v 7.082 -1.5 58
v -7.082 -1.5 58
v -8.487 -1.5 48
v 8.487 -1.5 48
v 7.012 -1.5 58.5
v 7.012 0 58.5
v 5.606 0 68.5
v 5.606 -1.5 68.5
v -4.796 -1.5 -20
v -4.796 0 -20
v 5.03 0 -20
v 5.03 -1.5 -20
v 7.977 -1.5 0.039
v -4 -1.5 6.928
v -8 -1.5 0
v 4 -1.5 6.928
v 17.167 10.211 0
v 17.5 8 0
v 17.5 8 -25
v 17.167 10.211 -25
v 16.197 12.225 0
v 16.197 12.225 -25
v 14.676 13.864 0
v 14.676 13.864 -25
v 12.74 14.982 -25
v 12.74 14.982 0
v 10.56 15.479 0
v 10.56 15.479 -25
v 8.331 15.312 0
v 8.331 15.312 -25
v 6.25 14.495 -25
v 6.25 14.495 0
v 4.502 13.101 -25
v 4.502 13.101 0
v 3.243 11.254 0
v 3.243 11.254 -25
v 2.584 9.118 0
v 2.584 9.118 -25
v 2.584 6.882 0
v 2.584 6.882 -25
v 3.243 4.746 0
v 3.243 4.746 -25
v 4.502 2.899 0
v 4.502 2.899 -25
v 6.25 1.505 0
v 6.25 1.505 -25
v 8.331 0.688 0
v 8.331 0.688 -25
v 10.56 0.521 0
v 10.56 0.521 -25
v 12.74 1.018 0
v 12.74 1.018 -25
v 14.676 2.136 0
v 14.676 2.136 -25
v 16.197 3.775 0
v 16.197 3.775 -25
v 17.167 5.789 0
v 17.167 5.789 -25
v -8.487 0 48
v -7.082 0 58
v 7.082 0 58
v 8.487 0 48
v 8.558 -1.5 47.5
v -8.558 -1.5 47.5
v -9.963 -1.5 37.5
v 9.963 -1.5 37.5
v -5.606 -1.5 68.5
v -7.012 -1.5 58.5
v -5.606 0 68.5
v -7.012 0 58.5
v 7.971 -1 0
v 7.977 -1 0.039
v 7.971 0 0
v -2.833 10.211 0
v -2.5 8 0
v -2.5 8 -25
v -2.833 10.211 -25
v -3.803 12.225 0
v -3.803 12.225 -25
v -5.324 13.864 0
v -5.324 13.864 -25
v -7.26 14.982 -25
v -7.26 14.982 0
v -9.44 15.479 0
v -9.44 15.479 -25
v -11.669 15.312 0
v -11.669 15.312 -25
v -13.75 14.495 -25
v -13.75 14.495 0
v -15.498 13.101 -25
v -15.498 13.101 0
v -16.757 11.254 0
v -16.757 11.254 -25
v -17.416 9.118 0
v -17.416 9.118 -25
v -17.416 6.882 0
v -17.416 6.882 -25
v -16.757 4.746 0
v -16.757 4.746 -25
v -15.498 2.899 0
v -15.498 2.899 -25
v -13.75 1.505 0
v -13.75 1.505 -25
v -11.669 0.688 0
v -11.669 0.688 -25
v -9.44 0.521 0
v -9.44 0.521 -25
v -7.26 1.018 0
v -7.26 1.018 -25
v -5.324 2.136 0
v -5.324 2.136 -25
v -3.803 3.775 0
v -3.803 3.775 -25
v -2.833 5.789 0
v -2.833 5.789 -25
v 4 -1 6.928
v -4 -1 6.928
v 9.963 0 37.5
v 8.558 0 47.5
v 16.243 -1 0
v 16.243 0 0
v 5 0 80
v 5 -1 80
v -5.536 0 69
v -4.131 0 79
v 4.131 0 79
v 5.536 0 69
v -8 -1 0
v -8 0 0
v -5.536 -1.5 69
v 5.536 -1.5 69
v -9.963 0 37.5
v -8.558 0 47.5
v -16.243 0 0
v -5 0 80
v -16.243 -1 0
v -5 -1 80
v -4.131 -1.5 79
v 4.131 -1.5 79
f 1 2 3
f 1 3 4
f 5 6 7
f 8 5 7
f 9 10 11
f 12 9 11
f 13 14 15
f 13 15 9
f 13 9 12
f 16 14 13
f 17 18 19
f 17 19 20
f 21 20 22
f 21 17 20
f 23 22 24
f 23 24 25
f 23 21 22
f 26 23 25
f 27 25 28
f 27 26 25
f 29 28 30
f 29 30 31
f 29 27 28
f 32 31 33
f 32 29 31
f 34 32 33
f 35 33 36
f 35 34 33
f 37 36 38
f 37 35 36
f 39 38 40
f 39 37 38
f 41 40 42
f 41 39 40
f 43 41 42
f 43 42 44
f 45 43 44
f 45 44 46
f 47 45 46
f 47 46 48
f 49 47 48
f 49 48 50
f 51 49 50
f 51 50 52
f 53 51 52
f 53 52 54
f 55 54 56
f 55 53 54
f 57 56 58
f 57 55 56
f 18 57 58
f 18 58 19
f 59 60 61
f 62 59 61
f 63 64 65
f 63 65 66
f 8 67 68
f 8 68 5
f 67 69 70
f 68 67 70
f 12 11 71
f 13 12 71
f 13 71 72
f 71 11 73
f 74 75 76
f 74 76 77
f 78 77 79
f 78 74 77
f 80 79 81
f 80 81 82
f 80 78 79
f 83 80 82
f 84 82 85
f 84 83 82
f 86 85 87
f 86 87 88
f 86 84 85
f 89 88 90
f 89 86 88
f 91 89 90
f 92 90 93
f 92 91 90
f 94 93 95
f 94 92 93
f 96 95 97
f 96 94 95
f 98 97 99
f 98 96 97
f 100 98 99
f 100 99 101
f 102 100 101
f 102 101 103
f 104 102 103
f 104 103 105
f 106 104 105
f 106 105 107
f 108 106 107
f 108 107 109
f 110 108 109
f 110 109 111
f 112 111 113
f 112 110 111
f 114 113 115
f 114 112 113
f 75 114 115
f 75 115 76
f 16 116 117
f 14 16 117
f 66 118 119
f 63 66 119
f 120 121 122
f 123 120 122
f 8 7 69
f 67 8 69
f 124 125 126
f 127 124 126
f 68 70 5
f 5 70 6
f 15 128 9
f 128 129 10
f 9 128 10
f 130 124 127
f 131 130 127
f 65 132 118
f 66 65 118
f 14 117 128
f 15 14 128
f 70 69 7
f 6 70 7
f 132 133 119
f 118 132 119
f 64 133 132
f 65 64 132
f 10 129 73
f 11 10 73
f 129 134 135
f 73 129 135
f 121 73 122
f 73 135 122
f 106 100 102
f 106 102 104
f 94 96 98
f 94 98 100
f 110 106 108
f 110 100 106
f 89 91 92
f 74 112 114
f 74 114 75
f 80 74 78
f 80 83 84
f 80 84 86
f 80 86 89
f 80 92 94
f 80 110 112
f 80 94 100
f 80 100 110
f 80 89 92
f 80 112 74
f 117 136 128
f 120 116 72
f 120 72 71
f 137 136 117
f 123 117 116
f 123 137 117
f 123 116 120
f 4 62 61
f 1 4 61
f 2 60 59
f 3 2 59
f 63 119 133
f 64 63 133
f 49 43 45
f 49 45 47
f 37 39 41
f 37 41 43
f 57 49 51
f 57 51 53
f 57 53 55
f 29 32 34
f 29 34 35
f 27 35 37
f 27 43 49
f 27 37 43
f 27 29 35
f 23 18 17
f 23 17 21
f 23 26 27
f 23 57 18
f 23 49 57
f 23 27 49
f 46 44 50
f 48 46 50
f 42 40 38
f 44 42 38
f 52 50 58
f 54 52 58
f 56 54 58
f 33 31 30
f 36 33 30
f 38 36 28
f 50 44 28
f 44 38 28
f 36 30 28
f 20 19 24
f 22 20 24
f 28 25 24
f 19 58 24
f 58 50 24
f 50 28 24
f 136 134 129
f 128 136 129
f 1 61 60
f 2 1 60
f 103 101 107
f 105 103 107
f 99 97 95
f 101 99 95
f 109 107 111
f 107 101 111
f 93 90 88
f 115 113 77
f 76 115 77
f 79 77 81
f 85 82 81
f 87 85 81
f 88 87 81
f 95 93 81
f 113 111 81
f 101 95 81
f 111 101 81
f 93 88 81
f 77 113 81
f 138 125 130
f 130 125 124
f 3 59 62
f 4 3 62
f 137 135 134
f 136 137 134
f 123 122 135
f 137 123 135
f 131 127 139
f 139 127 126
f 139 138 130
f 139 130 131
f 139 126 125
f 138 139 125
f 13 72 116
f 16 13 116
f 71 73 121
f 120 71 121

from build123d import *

# Parameters (mm, degrees)
F3_DEPTH = 1.5
F4_DEPTH = 1
F5_DEPTH = 1.5
F6_R     = 7.5
F7_DEPTH = 25


with BuildPart() as f3:
    # F2 (on Front) → F3 (new body)
    with BuildSketch(Plane.XZ):
        Polygon((5.536122, 69), (4.130713, 79), (-4.130713, 79), (-5.536122, 69), align=None)
        Polygon((5.606392, 68.5), (-5.606392, 68.5), (-7.0118, 58.5), (7.0118, 58.5), align=None)
        Polygon((-7.082071, 58), (-8.487479, 48), (8.487479, 48), (7.082071, 58), align=None)
        Polygon((-8.55775, 47.5), (-9.963158, 37.5), (9.963158, 37.5), (8.55775, 47.5), align=None)
    extrude(amount=F3_DEPTH)


with BuildPart() as f4:
    # F0 (on Front) → F4 (new body)
    with BuildSketch(Plane.XZ):
        Polygon((5, 80), (-5, 80), (-16.243267, 0), (16.243267, 0), align=None)
    extrude(amount=F4_DEPTH)

    # F1 (on Front) → F5 (join)
    with BuildSketch(Plane.XZ):
        Polygon((-4, 6.928203), (-8, 0), (-4.796107, -20), (5.02966, -20), (7.977267, 0.039375), (4, 6.928203), align=None)
    extrude(amount=F5_DEPTH)


with BuildPart() as f7:
    # F6 (on Top) → F7 (new body)
    with BuildSketch(Plane.XY):
        with Locations((-10, 8)):
            Circle(F6_R)
        with Locations((10, 8)):
            Circle(F6_R)
    extrude(amount=-F7_DEPTH)


solid = Compound([f3.part, f4.part, f7.part])
